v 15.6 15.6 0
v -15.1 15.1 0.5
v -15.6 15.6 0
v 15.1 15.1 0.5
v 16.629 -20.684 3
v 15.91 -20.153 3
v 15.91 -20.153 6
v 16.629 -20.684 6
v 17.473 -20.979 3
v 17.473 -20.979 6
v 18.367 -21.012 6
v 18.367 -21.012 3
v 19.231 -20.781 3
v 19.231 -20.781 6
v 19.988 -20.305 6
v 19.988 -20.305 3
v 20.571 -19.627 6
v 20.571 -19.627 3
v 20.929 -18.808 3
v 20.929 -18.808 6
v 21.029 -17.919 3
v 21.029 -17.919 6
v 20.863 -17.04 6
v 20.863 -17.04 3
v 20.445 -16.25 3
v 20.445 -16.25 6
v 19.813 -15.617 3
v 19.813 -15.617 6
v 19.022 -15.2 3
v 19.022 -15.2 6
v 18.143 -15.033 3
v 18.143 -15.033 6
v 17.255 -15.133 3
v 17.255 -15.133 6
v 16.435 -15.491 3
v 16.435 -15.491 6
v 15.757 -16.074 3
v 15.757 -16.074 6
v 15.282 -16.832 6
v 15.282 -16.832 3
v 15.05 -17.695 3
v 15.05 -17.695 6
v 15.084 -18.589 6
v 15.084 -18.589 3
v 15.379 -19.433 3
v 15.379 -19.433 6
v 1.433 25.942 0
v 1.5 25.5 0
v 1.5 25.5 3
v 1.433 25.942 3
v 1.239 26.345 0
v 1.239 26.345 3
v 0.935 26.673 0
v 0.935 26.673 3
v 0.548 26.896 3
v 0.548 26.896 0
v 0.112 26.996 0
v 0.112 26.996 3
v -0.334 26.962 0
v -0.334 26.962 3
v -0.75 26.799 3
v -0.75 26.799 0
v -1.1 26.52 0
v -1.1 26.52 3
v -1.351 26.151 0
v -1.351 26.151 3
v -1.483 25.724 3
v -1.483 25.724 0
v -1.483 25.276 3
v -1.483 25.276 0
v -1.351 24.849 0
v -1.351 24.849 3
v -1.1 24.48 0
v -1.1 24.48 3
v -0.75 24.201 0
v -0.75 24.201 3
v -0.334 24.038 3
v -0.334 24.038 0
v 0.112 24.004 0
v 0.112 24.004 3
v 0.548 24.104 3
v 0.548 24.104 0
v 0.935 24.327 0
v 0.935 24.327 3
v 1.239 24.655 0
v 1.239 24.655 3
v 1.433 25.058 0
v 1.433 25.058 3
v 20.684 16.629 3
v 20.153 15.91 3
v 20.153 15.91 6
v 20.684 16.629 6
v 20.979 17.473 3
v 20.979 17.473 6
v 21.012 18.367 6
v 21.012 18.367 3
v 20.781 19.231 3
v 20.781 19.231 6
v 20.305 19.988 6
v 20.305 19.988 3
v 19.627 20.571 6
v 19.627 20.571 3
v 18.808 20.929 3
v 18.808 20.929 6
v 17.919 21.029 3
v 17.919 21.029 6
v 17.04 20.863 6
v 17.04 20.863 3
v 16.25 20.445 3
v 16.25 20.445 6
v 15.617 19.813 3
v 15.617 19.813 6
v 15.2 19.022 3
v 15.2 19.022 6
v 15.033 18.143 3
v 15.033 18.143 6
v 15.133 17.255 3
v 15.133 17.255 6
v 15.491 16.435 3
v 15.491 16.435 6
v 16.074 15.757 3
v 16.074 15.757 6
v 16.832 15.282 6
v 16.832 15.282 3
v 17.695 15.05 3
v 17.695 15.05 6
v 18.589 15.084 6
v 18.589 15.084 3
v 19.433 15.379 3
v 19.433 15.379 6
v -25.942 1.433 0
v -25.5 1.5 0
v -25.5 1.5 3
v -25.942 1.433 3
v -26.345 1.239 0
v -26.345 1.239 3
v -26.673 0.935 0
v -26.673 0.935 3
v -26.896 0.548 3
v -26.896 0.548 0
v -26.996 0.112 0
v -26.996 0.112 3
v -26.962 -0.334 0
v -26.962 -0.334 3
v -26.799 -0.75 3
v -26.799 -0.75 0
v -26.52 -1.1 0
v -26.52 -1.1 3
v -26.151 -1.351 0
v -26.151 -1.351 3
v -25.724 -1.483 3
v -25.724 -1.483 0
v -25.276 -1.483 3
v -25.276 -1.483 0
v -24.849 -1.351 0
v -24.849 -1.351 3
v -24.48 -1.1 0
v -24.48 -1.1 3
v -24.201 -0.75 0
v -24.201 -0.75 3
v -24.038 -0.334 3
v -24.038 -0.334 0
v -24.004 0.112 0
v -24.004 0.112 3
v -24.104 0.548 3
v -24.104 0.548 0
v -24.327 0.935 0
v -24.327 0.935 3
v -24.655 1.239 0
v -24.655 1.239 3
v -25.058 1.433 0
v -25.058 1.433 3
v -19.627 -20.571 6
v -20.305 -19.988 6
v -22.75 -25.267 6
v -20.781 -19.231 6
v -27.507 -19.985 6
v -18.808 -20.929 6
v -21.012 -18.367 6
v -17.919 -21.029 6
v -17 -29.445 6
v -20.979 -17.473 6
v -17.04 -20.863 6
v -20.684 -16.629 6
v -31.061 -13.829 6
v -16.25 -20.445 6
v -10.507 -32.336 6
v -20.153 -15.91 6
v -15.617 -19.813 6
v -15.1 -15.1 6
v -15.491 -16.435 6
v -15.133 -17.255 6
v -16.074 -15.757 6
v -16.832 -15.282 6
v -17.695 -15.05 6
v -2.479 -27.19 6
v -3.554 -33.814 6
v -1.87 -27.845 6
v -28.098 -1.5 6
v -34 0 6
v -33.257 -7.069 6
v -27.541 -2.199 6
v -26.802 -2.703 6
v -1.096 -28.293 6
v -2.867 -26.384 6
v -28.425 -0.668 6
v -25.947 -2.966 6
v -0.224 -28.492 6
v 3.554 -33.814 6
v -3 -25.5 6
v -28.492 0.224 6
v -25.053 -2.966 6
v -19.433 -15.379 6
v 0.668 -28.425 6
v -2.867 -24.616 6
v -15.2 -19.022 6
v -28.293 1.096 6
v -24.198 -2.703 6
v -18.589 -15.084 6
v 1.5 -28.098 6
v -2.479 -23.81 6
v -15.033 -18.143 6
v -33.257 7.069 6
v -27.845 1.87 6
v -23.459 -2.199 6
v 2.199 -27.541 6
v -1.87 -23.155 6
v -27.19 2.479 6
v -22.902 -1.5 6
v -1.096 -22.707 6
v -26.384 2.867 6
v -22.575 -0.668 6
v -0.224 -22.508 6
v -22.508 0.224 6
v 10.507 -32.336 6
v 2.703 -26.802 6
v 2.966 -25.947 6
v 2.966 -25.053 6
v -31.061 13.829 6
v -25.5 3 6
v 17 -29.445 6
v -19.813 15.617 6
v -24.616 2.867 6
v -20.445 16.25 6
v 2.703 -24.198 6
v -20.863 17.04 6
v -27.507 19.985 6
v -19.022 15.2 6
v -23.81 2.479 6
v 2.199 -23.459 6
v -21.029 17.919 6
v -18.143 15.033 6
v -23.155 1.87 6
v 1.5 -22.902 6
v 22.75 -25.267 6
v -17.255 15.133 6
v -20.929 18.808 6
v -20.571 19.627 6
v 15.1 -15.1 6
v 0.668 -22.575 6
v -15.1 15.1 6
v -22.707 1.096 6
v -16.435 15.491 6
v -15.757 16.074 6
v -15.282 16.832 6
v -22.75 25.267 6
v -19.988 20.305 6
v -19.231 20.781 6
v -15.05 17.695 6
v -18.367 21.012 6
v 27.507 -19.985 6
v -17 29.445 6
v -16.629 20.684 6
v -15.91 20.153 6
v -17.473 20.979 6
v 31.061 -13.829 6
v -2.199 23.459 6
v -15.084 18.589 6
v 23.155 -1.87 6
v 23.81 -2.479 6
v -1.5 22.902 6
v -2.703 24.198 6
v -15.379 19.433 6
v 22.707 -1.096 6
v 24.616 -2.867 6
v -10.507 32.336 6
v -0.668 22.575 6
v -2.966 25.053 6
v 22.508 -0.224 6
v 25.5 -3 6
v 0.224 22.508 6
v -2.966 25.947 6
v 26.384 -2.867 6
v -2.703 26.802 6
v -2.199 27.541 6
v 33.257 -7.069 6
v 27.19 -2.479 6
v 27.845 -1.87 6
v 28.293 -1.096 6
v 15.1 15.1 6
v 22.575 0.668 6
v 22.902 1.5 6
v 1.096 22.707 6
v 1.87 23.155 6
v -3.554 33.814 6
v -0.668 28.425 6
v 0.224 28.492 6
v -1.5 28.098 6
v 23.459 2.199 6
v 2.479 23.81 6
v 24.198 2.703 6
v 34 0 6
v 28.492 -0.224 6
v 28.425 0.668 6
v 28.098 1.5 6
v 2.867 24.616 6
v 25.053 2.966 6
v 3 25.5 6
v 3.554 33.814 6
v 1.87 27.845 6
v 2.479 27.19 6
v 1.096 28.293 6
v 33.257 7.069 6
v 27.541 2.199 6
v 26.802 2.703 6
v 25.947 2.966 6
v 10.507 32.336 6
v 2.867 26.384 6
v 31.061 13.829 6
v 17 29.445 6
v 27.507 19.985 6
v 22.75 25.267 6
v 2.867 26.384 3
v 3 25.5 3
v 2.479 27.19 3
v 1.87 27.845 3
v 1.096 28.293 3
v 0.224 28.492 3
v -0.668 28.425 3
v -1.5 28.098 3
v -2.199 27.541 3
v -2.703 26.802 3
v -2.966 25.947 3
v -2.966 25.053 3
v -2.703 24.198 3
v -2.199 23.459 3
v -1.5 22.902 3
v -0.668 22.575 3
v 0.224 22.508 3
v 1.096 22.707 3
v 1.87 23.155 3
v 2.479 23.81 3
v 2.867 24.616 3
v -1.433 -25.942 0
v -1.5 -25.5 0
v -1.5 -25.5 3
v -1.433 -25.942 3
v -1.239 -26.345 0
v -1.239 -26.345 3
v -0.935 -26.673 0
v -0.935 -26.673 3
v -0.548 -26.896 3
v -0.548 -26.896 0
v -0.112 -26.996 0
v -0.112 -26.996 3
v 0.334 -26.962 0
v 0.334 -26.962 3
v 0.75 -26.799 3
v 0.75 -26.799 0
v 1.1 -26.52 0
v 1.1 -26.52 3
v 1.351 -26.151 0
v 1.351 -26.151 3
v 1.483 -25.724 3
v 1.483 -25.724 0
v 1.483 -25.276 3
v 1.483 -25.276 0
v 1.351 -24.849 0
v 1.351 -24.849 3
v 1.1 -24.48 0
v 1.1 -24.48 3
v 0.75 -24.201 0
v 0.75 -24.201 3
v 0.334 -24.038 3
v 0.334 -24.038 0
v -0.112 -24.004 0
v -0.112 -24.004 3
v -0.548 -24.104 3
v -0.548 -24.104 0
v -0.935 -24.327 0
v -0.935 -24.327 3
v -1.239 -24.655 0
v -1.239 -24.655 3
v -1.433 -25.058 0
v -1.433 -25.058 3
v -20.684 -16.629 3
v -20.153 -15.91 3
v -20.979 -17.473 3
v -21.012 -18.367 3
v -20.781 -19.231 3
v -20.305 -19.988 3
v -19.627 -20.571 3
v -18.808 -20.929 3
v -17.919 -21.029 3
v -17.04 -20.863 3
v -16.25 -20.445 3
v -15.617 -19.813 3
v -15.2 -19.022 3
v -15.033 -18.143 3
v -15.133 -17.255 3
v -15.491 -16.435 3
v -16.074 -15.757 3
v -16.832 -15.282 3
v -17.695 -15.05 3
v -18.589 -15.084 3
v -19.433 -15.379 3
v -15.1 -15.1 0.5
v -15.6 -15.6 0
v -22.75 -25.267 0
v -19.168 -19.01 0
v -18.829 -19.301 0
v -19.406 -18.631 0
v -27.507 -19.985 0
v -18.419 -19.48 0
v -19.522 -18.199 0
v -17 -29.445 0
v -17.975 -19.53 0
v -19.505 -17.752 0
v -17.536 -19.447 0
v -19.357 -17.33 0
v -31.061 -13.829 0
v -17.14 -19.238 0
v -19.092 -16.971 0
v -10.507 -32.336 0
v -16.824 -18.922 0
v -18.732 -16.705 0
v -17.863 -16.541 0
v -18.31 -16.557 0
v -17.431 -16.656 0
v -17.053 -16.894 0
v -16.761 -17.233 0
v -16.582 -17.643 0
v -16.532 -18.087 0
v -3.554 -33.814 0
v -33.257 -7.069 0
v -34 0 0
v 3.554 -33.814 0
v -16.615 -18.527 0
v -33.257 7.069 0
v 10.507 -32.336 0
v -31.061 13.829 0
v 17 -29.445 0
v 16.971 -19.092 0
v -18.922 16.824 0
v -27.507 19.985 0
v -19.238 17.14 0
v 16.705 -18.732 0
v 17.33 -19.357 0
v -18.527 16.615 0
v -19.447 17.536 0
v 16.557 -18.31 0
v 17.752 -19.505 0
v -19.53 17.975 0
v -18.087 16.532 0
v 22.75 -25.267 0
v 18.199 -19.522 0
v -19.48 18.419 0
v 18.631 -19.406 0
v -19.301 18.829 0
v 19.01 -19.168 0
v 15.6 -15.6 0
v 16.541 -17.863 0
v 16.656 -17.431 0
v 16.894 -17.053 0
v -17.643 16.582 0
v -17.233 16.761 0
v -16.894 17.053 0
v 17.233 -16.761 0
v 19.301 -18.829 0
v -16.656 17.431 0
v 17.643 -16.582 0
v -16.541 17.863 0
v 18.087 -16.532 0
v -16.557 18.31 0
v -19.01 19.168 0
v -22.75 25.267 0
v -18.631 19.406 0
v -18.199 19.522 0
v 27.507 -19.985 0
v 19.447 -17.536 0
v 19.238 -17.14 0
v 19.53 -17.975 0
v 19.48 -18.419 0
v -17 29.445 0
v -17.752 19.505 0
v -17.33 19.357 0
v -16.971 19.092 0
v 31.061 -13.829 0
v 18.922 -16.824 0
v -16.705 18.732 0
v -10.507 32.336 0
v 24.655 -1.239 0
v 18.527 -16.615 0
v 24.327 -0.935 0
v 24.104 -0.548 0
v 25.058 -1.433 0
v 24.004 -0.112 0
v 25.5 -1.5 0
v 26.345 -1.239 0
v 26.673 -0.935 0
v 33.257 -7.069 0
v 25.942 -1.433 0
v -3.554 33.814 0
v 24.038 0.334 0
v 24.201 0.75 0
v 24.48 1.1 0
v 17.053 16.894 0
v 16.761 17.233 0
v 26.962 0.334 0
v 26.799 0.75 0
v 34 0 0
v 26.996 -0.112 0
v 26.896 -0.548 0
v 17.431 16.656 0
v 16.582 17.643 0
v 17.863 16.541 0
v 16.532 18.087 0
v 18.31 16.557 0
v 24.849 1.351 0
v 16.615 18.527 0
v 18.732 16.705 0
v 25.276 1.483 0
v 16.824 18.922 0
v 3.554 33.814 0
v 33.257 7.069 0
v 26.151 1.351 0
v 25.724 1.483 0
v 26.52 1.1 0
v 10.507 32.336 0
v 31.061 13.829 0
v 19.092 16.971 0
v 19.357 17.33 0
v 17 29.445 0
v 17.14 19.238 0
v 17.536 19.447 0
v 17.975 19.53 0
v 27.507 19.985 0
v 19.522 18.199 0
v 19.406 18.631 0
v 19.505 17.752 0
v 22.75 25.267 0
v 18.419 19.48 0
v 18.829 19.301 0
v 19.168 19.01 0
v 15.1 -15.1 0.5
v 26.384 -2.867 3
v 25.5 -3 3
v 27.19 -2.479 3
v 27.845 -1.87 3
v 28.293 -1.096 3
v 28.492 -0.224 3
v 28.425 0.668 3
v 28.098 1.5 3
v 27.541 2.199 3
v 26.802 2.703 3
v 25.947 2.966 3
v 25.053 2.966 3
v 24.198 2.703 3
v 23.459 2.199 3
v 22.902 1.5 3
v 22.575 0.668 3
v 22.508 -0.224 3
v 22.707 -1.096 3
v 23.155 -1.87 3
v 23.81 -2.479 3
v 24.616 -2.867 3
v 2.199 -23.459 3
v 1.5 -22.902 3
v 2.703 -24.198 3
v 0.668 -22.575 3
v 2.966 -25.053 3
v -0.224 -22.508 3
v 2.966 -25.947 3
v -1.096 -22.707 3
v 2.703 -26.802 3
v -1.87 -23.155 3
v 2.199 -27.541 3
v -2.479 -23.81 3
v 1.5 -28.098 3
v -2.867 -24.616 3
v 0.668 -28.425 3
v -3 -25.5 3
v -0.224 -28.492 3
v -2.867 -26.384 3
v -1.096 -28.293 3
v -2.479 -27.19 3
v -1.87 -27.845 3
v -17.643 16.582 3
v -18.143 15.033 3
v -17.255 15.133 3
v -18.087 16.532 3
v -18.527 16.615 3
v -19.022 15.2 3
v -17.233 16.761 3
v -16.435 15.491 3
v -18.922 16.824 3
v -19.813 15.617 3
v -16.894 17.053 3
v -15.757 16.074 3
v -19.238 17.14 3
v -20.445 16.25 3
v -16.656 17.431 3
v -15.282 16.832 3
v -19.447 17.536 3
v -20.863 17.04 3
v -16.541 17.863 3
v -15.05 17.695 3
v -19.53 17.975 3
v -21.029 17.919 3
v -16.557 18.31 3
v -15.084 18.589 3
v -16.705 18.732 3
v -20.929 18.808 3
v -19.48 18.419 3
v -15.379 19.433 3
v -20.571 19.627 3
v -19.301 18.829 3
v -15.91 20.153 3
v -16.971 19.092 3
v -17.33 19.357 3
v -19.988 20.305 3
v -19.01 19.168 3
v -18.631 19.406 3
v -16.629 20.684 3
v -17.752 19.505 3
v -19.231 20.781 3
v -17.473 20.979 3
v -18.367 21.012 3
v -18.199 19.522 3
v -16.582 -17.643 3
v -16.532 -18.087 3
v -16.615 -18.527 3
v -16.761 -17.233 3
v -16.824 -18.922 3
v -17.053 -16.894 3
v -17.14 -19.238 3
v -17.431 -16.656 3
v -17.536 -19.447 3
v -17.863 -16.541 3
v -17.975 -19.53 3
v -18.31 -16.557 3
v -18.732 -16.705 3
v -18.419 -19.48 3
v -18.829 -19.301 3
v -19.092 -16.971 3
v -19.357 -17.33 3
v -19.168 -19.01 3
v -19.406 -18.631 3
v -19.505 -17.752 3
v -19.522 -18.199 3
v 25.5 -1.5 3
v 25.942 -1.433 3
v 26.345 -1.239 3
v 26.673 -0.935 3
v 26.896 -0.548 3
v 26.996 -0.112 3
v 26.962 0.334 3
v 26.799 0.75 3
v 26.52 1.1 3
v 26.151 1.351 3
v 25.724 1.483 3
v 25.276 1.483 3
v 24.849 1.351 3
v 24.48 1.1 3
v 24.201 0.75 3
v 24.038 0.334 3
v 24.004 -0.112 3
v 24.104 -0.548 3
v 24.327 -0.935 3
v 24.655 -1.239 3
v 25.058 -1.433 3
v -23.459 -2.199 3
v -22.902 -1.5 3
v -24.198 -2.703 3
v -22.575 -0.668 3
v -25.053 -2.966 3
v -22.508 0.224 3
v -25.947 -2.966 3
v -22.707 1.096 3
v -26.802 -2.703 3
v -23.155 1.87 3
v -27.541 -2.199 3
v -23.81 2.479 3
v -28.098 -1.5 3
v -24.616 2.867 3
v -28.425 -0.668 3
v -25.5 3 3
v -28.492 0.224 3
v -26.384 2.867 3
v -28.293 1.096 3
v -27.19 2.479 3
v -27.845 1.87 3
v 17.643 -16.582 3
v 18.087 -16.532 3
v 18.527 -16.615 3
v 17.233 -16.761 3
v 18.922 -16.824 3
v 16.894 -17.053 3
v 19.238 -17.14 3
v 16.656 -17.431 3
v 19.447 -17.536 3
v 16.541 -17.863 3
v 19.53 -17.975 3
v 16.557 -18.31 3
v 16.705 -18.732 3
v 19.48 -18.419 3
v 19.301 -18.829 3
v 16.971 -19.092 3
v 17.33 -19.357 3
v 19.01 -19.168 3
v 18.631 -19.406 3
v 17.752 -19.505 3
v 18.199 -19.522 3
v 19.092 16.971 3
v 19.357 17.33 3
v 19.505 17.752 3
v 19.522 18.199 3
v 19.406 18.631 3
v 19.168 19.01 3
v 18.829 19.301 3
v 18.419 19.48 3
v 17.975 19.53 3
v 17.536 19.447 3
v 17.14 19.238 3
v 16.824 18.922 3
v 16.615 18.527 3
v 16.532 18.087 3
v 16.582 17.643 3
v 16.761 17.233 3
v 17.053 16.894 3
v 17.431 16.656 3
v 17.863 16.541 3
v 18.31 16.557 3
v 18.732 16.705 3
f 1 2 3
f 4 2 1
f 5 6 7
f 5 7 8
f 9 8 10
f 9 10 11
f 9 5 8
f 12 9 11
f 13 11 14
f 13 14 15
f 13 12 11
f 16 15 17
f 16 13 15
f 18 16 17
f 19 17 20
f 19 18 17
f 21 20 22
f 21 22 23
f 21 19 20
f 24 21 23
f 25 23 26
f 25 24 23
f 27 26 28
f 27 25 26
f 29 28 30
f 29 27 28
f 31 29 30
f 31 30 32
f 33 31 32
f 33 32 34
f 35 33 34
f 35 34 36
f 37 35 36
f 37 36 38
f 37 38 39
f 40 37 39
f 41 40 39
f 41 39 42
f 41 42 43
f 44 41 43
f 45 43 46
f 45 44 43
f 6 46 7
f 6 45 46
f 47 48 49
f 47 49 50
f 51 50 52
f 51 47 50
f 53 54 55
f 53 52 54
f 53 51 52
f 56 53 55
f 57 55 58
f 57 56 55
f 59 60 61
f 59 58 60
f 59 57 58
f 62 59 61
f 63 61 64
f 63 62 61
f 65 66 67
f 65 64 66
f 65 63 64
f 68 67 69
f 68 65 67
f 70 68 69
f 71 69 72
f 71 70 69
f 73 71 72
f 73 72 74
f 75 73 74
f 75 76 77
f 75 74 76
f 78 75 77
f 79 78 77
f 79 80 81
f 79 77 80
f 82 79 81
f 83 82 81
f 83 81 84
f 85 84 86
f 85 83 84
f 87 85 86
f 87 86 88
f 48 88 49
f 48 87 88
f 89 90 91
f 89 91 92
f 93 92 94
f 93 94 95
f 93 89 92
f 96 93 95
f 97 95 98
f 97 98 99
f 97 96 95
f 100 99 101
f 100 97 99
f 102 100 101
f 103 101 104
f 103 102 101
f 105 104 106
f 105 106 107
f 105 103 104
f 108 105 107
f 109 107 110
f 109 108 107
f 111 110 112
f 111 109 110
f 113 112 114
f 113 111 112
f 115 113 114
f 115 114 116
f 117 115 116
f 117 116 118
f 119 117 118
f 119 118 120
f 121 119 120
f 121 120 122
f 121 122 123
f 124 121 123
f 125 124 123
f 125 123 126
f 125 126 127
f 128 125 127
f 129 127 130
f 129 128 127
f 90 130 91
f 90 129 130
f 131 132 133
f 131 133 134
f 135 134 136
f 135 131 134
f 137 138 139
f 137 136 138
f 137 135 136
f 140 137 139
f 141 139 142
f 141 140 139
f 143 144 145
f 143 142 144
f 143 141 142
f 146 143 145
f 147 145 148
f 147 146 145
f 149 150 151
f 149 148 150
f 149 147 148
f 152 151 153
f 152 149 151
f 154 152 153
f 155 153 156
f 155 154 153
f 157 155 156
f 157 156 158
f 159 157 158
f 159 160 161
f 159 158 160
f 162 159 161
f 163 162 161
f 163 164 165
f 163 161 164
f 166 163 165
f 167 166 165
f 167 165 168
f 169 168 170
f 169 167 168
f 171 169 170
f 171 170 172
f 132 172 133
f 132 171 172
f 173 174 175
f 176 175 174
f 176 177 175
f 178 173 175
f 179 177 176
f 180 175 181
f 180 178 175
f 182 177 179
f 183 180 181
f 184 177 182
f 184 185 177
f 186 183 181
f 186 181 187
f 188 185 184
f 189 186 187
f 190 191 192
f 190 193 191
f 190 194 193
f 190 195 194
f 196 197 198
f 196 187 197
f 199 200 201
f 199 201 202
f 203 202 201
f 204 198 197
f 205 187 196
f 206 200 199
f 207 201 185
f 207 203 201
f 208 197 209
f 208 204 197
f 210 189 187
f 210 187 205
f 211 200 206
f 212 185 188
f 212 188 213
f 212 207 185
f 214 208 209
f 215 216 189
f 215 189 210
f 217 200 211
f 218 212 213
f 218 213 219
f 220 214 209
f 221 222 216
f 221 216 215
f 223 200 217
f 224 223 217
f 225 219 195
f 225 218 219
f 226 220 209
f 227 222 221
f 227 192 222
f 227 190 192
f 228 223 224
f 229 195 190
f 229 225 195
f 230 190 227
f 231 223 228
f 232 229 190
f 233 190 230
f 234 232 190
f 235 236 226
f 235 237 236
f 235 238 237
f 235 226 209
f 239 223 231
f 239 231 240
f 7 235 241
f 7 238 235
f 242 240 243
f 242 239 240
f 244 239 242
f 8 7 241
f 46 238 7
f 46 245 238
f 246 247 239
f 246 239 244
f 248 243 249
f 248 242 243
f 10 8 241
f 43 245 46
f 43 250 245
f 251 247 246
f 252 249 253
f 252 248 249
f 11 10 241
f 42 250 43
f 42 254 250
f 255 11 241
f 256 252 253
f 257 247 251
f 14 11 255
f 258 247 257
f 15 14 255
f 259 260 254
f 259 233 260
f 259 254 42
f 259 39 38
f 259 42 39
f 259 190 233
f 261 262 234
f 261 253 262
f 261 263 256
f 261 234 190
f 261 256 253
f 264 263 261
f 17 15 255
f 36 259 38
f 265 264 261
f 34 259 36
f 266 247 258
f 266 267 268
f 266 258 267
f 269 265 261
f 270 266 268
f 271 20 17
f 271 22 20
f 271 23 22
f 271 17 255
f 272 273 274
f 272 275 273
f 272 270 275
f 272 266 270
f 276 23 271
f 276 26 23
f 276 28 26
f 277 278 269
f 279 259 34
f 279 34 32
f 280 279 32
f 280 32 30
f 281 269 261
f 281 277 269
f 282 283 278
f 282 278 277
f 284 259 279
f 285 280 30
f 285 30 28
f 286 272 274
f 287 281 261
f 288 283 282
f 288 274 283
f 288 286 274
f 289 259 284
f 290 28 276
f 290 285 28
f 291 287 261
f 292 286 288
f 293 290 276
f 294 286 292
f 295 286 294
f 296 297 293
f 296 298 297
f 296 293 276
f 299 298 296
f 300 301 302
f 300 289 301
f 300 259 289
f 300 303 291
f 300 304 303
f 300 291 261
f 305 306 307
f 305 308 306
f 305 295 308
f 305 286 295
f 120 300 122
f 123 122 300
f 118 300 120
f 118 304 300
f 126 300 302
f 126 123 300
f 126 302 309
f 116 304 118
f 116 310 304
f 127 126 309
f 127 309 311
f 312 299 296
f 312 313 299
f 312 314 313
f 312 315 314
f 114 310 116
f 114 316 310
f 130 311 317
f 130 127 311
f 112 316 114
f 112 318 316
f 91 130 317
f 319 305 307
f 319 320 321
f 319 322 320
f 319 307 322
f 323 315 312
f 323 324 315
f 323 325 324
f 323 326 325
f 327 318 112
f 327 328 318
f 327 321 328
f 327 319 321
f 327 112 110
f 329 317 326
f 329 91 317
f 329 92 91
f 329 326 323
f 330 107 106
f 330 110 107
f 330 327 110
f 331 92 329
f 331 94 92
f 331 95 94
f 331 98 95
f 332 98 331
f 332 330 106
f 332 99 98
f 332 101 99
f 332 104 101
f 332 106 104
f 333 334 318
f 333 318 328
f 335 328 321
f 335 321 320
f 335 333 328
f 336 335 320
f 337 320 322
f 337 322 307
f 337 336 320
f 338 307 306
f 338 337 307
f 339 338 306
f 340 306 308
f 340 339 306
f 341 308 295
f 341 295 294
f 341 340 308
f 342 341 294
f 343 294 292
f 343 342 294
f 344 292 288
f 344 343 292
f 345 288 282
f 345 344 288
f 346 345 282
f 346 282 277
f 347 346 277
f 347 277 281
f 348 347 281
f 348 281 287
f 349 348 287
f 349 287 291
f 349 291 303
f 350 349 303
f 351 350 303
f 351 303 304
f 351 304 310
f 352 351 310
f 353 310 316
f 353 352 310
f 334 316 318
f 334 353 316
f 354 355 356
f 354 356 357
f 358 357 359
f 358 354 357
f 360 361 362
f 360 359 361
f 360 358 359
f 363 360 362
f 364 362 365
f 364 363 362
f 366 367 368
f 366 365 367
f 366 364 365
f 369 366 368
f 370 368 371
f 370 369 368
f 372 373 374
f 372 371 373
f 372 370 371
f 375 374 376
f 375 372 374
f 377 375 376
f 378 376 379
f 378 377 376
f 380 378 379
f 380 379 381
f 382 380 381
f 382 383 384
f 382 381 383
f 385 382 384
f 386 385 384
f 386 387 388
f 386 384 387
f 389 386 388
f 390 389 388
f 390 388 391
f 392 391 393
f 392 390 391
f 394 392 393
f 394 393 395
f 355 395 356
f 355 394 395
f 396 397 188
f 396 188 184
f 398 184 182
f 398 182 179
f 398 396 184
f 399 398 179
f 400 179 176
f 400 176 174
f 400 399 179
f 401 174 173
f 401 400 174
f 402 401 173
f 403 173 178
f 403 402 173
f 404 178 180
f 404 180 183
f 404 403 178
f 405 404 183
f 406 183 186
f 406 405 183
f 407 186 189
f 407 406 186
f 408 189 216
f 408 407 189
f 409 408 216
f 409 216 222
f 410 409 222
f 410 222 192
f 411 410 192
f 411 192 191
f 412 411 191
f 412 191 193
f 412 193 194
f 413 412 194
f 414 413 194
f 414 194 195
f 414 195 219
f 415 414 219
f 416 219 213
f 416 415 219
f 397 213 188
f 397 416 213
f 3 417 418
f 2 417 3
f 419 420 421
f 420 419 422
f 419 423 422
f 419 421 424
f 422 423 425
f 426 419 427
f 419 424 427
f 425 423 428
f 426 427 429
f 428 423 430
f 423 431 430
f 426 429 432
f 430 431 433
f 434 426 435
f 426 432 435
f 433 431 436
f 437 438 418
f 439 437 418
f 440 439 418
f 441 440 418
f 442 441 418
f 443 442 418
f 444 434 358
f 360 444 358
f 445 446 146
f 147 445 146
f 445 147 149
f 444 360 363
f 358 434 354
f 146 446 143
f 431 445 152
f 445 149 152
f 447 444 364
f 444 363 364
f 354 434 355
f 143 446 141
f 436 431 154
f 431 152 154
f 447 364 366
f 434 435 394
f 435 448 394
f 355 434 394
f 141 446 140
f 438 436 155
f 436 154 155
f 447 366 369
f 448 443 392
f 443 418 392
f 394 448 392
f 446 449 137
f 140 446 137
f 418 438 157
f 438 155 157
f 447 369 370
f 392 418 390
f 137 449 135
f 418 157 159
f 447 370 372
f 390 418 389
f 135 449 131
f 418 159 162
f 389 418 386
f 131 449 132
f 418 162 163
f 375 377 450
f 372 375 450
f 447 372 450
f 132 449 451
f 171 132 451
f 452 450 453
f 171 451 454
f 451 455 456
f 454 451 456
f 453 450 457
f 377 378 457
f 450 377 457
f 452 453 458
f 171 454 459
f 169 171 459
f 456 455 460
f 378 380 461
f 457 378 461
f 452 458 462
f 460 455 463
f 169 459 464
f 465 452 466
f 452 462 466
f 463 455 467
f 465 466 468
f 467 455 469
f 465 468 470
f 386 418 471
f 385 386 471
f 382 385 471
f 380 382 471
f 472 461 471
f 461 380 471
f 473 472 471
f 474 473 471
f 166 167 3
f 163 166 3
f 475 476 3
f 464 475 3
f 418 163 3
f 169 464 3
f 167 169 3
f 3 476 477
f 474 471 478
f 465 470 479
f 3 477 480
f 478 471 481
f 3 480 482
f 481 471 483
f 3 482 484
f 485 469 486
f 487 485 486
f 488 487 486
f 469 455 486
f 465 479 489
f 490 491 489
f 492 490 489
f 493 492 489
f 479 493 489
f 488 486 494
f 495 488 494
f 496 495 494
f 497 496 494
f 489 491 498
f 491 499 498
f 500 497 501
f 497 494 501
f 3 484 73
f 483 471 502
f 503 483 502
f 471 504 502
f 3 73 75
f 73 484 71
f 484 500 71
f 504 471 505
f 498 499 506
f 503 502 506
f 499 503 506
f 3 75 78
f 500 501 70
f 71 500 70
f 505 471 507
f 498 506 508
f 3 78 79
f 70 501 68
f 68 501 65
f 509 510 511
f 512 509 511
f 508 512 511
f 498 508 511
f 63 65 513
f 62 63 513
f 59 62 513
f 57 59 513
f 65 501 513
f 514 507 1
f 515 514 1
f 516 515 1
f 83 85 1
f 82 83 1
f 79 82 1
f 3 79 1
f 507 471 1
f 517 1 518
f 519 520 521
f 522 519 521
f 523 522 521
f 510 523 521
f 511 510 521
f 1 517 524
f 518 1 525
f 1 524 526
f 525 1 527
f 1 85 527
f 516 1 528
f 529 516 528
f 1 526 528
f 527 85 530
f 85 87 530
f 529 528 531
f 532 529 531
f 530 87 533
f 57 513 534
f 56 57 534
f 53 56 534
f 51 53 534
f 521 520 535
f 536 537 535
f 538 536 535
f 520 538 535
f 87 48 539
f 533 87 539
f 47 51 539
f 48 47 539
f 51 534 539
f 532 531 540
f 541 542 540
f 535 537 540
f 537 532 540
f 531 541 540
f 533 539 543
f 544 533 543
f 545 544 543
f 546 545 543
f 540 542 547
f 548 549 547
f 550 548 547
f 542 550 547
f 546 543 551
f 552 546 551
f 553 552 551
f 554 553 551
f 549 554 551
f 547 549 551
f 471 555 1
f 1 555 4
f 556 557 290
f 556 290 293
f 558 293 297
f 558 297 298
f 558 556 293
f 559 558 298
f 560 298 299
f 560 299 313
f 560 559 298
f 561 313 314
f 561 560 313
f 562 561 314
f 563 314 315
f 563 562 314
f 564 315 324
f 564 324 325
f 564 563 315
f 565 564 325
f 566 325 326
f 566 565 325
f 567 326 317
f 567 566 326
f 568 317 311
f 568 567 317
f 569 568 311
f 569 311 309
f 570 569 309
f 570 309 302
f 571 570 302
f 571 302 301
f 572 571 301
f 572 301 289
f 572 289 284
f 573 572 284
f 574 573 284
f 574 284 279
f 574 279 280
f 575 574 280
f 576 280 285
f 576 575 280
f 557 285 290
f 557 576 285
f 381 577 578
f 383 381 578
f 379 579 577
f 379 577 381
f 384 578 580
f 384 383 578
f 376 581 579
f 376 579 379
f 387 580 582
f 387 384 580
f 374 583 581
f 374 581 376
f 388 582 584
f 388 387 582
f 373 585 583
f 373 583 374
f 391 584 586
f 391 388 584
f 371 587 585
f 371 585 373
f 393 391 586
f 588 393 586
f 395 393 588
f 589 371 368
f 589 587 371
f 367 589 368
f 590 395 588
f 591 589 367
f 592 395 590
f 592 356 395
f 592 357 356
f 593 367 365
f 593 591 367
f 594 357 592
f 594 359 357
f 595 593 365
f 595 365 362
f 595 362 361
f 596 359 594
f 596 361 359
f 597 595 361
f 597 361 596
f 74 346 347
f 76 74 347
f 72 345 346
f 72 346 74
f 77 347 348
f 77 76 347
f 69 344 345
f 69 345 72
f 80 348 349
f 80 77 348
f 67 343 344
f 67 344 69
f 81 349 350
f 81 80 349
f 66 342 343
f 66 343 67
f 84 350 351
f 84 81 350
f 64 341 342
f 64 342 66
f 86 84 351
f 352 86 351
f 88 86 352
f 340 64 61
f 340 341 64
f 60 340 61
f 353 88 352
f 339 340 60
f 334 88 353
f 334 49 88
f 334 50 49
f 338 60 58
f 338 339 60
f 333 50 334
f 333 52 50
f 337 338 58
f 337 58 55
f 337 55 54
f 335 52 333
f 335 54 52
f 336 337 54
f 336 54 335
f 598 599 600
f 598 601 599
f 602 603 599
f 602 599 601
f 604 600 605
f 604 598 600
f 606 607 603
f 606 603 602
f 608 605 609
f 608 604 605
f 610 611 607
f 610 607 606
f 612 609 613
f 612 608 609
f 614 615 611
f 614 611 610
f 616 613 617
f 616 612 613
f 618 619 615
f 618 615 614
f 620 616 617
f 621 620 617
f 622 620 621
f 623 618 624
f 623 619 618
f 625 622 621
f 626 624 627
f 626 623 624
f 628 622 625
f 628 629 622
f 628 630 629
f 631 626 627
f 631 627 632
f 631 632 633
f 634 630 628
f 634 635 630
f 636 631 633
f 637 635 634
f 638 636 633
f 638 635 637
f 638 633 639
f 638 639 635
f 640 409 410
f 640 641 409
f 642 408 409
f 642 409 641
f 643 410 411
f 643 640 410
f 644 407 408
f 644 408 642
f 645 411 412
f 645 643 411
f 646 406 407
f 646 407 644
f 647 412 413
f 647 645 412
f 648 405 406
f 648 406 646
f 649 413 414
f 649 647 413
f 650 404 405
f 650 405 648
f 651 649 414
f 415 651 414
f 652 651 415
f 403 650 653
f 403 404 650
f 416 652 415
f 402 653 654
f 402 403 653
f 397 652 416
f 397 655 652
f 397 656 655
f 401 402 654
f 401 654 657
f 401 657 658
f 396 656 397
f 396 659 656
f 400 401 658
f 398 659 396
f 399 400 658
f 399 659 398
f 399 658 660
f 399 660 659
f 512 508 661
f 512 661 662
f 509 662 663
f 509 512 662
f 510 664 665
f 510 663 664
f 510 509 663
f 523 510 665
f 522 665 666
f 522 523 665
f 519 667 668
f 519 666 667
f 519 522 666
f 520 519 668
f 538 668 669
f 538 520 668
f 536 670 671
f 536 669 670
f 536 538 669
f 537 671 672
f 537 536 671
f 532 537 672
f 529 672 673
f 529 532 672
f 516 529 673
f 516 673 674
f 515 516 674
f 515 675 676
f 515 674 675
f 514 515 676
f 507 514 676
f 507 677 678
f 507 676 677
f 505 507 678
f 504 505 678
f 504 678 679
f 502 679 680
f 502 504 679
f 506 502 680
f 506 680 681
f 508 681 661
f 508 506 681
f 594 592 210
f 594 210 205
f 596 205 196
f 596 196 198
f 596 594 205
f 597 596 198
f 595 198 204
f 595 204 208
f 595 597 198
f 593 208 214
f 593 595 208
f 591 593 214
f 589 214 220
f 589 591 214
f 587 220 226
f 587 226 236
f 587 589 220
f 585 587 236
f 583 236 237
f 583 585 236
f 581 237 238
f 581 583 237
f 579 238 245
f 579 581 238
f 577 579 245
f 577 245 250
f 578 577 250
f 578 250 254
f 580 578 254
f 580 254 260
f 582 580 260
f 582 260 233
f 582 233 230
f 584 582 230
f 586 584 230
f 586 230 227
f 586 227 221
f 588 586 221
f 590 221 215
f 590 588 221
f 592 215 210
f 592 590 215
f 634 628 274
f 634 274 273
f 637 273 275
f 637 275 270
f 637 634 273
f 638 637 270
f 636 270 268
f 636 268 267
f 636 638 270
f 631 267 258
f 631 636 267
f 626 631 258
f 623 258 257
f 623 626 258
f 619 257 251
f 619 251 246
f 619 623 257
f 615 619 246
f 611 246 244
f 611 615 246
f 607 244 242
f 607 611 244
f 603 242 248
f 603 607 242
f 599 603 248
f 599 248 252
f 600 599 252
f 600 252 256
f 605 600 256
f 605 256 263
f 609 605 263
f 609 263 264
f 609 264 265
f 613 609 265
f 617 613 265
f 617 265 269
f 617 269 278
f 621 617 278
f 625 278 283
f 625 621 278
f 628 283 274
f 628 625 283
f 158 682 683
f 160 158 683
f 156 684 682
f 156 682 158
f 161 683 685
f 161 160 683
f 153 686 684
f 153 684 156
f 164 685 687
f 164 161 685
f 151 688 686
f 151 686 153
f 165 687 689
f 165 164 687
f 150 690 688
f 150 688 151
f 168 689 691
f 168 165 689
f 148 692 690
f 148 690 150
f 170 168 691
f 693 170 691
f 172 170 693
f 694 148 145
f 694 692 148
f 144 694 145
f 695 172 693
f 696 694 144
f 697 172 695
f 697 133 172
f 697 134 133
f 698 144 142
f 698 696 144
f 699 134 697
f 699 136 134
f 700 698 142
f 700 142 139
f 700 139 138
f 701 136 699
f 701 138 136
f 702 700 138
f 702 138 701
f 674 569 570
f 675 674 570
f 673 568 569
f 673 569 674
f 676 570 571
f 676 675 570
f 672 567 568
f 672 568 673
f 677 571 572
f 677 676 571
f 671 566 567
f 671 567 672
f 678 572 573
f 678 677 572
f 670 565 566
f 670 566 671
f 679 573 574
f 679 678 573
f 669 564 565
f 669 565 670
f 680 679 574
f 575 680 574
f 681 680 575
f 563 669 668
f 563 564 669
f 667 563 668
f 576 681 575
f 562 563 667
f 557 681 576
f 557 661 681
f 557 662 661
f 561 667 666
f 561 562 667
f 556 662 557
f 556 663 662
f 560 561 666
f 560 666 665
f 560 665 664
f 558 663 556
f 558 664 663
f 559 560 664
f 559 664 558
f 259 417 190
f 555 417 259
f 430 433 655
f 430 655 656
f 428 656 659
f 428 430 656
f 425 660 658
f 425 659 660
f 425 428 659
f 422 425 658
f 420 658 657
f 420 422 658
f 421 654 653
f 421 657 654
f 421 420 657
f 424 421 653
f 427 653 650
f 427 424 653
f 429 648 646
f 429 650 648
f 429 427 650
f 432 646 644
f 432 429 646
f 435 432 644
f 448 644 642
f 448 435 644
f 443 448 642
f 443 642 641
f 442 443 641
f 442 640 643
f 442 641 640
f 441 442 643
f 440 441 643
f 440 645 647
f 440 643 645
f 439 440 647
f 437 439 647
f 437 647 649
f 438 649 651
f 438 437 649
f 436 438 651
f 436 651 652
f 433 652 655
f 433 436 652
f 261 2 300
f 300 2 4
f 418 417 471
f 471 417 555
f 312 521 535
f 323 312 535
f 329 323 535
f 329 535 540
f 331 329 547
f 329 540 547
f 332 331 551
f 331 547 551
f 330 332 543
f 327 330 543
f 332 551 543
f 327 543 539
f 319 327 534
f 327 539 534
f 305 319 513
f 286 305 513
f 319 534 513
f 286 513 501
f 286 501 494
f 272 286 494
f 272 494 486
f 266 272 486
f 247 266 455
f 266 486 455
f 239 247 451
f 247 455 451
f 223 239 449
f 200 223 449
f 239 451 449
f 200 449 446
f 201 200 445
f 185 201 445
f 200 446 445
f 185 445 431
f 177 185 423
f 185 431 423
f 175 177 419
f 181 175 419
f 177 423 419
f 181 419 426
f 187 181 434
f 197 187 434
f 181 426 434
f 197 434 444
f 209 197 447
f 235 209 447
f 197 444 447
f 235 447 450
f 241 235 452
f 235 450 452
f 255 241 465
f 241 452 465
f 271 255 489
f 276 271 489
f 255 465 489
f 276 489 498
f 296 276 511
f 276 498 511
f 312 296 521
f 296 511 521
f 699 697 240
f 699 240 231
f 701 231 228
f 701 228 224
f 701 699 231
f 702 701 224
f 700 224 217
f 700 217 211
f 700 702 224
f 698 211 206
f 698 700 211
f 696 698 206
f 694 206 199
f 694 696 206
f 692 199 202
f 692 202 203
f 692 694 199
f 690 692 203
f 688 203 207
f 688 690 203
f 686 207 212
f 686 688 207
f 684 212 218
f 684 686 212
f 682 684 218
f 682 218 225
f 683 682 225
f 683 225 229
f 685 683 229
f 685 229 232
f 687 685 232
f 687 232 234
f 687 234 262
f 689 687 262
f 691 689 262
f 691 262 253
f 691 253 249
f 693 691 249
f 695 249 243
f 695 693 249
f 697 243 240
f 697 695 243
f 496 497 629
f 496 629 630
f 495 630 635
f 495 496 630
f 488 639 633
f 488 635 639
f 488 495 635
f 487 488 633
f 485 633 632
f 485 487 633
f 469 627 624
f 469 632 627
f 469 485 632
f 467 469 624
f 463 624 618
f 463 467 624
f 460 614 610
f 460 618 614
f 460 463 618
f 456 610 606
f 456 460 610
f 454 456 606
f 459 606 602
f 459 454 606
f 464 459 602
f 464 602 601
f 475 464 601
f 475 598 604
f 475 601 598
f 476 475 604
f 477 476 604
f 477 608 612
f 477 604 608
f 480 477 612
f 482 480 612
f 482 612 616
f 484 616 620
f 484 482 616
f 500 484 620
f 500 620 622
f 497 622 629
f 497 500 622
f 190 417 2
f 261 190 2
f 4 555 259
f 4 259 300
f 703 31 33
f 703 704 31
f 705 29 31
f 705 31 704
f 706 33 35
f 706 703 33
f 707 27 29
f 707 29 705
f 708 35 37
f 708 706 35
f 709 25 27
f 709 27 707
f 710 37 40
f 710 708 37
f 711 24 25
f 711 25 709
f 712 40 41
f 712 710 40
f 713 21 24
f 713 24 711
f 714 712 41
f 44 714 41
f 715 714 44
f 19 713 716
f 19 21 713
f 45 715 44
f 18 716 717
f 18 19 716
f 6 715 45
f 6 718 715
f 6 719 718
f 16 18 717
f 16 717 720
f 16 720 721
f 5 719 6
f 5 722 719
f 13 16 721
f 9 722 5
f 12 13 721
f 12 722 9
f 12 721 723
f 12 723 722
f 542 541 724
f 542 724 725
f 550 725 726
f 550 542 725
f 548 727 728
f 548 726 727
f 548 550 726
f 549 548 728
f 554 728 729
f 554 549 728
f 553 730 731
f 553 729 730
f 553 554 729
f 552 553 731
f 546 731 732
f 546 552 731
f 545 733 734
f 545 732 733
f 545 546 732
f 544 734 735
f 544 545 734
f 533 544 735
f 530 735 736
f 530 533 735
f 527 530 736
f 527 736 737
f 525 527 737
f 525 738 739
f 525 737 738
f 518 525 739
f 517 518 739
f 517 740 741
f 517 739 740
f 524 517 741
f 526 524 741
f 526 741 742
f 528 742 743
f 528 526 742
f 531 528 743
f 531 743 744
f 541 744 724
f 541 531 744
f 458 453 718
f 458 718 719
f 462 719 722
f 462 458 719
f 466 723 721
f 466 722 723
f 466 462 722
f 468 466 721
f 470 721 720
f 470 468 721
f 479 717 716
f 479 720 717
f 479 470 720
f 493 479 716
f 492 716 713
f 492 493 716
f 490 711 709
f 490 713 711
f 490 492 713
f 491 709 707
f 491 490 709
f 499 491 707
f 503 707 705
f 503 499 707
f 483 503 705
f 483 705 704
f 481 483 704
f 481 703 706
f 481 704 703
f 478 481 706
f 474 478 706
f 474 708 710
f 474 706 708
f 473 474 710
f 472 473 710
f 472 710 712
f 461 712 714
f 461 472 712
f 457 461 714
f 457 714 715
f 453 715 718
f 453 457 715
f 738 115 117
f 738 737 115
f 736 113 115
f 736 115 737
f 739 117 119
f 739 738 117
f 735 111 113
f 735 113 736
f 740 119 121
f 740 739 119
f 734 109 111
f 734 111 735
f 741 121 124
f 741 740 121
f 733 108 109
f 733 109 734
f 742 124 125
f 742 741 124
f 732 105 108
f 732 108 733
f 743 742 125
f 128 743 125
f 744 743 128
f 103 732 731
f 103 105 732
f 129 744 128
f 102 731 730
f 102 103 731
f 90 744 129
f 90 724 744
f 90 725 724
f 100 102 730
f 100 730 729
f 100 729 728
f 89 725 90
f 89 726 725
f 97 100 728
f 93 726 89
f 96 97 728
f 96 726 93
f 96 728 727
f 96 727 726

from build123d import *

# Parameters (mm, degrees)
BOX743_W                     = 30.2
BOX743_H                     = 30.2
BOX743_DEPTH                 = 25
CYLINDER1930_R               = 1.5
CYLINDER1930_DEPTH           = 20
CYLINDER1930_PLACEMENT_ANGLE = 45
CYLINDER1927_R               = 1.5
CYLINDER1927_DEPTH           = 20
CYLINDER1933_R               = 1.5
CYLINDER1933_DEPTH           = 20
CYLINDER1933_PLACEMENT_ANGLE = 135
CYLINDER1929_R               = 1.5
CYLINDER1929_DEPTH           = 20
CYLINDER1935_R               = 1.5
CYLINDER1935_DEPTH           = 20
CYLINDER1935_PLACEMENT_ANGLE = 225
CYLINDER1928_R               = 1.5
CYLINDER1928_DEPTH           = 20
CYLINDER1943_R               = 1.5
CYLINDER1943_DEPTH           = 20
CYLINDER1943_PLACEMENT_ANGLE = 45
CYLINDER1937_R               = 1.5
CYLINDER1937_DEPTH           = 20
CYLINDER1940_R               = 3
CYLINDER1940_DEPTH           = 3
CYLINDER1940_PLACEMENT_ANGLE = 45
CYLINDER1942_R               = 3
CYLINDER1942_DEPTH           = 3
CYLINDER1941_R               = 3
CYLINDER1941_DEPTH           = 3
CYLINDER1941_PLACEMENT_ANGLE = 135
CYLINDER1939_R               = 3
CYLINDER1939_DEPTH           = 3
CYLINDER1932_R               = 3
CYLINDER1932_DEPTH           = 3
CYLINDER1932_PLACEMENT_ANGLE = 225
CYLINDER1938_R               = 3
CYLINDER1938_DEPTH           = 3
CYLINDER1931_R               = 3
CYLINDER1931_DEPTH           = 3
CYLINDER1931_PLACEMENT_ANGLE = 45
CYLINDER1934_R               = 3
CYLINDER1934_DEPTH           = 3
CYLINDER1936_R               = 34
CYLINDER1936_DEPTH           = 6
CHAMFER078_SIZE              = 0.5


with BuildPart() as krychle743:
    # Box743 → Box743 (new body)
    with BuildSketch(Plane(origin=(-15.1, -15.1, 0), x_dir=(1, 0, 0), z_dir=(0, 0, 1))):
        with Locations((15.1, 15.1)):
            Rectangle(BOX743_W, BOX743_H)
    extrude(amount=BOX743_DEPTH)


with BuildPart() as v_lec1930:
    # Cylinder1930 → Cylinder1930 (new body)
    with BuildSketch(Plane.XY):
        Circle(CYLINDER1930_R)
    extrude(amount=CYLINDER1930_DEPTH)


with BuildPart() as v_lec1930_1:
    # Cylinder1930 placement: moved
    add(v_lec1930.part.moved(Location((-18.031223, 18.031223, -4))).rotate(Axis((-18.031223, 18.031223, -4), (0, 0, 1)), CYLINDER1930_PLACEMENT_ANGLE))


with BuildPart() as v_lec1927:
    # Cylinder1927 → Cylinder1927 (new body)
    with BuildSketch(Plane(origin=(-25.5, 0, -4), x_dir=(0, 1, 0), z_dir=(0, 0, 1))):
        Circle(CYLINDER1927_R)
    extrude(amount=CYLINDER1927_DEPTH)


with BuildPart() as v_lec1933:
    # Cylinder1933 → Cylinder1933 (new body)
    with BuildSketch(Plane.XY):
        Circle(CYLINDER1933_R)
    extrude(amount=CYLINDER1933_DEPTH)


with BuildPart() as v_lec1933_1:
    # Cylinder1933 placement: moved
    add(v_lec1933.part.moved(Location((-18.031223, -18.031223, -4))).rotate(Axis((-18.031223, -18.031223, -4), (0, 0, 1)), CYLINDER1933_PLACEMENT_ANGLE))


with BuildPart() as v_lec1929:
    # Cylinder1929 → Cylinder1929 (new body)
    with BuildSketch(Plane(origin=(0, -25.5, -4), x_dir=(-1, 0, 0), z_dir=(0, 0, 1))):
        Circle(CYLINDER1929_R)
    extrude(amount=CYLINDER1929_DEPTH)


with BuildPart() as v_lec1935:
    # Cylinder1935 → Cylinder1935 (new body)
    with BuildSketch(Plane.XY):
        Circle(CYLINDER1935_R)
    extrude(amount=CYLINDER1935_DEPTH)


with BuildPart() as v_lec1935_1:
    # Cylinder1935 placement: moved
    add(v_lec1935.part.moved(Location((18.031223, -18.031223, -4))).rotate(Axis((18.031223, -18.031223, -4), (0, 0, 1)), CYLINDER1935_PLACEMENT_ANGLE))


with BuildPart() as v_lec1928:
    # Cylinder1928 → Cylinder1928 (new body)
    with BuildSketch(Plane(origin=(25.5, 0, -4), x_dir=(0, -1, 0), z_dir=(0, 0, 1))):
        Circle(CYLINDER1928_R)
    extrude(amount=CYLINDER1928_DEPTH)


with BuildPart() as v_lec1943:
    # Cylinder1943 → Cylinder1943 (new body)
    with BuildSketch(Plane.XY):
        Circle(CYLINDER1943_R)
    extrude(amount=CYLINDER1943_DEPTH)


with BuildPart() as v_lec1943_1:
    # Cylinder1943 placement: moved
    add(v_lec1943.part.moved(Location((18.031223, 18.031223, -4))).rotate(Axis((18.031223, 18.031223, -4), (0, 0, -1)), CYLINDER1943_PLACEMENT_ANGLE))


with BuildPart() as compound919:
    # Cylinder1937 → Cylinder1937 (new body)
    with BuildSketch(Plane(origin=(0, 25.5, -4), x_dir=(1, 0, 0), z_dir=(0, 0, 1))):
        Circle(CYLINDER1937_R)
    extrude(amount=CYLINDER1937_DEPTH)

    # Compound919: union Válec1930, Válec1927, Válec1933, Válec1929, Válec1935, Válec1928, Válec1943
    add(v_lec1930_1.part)
    add(v_lec1927.part)
    add(v_lec1933_1.part)
    add(v_lec1929.part)
    add(v_lec1935_1.part)
    add(v_lec1928.part)
    add(v_lec1943_1.part)


with BuildPart() as v_lec1940:
    # Cylinder1940 → Cylinder1940 (new body)
    with BuildSketch(Plane.XY):
        Circle(CYLINDER1940_R)
    extrude(amount=CYLINDER1940_DEPTH)


with BuildPart() as v_lec1940_1:
    # Cylinder1940 placement: moved
    add(v_lec1940.part.moved(Location((-18.031223, 18.031223, 3))).rotate(Axis((-18.031223, 18.031223, 3), (0, 0, 1)), CYLINDER1940_PLACEMENT_ANGLE))


with BuildPart() as v_lec1942:
    # Cylinder1942 → Cylinder1942 (new body)
    with BuildSketch(Plane(origin=(-25.5, 0, 3), x_dir=(0, 1, 0), z_dir=(0, 0, 1))):
        Circle(CYLINDER1942_R)
    extrude(amount=CYLINDER1942_DEPTH)


with BuildPart() as v_lec1941:
    # Cylinder1941 → Cylinder1941 (new body)
    with BuildSketch(Plane.XY):
        Circle(CYLINDER1941_R)
    extrude(amount=CYLINDER1941_DEPTH)


with BuildPart() as v_lec1941_1:
    # Cylinder1941 placement: moved
    add(v_lec1941.part.moved(Location((-18.031223, -18.031223, 3))).rotate(Axis((-18.031223, -18.031223, 3), (0, 0, 1)), CYLINDER1941_PLACEMENT_ANGLE))


with BuildPart() as v_lec1939:
    # Cylinder1939 → Cylinder1939 (new body)
    with BuildSketch(Plane(origin=(0, -25.5, 3), x_dir=(-1, 0, 0), z_dir=(0, 0, 1))):
        Circle(CYLINDER1939_R)
    extrude(amount=CYLINDER1939_DEPTH)


with BuildPart() as v_lec1932:
    # Cylinder1932 → Cylinder1932 (new body)
    with BuildSketch(Plane.XY):
        Circle(CYLINDER1932_R)
    extrude(amount=CYLINDER1932_DEPTH)


with BuildPart() as v_lec1932_1:
    # Cylinder1932 placement: moved
    add(v_lec1932.part.moved(Location((18.031223, -18.031223, 3))).rotate(Axis((18.031223, -18.031223, 3), (0, 0, 1)), CYLINDER1932_PLACEMENT_ANGLE))


with BuildPart() as v_lec1938:
    # Cylinder1938 → Cylinder1938 (new body)
    with BuildSketch(Plane(origin=(25.5, 0, 3), x_dir=(0, -1, 0), z_dir=(0, 0, 1))):
        Circle(CYLINDER1938_R)
    extrude(amount=CYLINDER1938_DEPTH)


with BuildPart() as v_lec1931:
    # Cylinder1931 → Cylinder1931 (new body)
    with BuildSketch(Plane.XY):
        Circle(CYLINDER1931_R)
    extrude(amount=CYLINDER1931_DEPTH)


with BuildPart() as v_lec1931_1:
    # Cylinder1931 placement: moved
    add(v_lec1931.part.moved(Location((18.031223, 18.031223, 3))).rotate(Axis((18.031223, 18.031223, 3), (0, 0, -1)), CYLINDER1931_PLACEMENT_ANGLE))


with BuildPart() as compound918:
    # Cylinder1934 → Cylinder1934 (new body)
    with BuildSketch(Plane(origin=(0, 25.5, 3), x_dir=(1, 0, 0), z_dir=(0, 0, 1))):
        Circle(CYLINDER1934_R)
    extrude(amount=CYLINDER1934_DEPTH)

    # Compound918: union Válec1940, Válec1942, Válec1941, Válec1939, Válec1932, Válec1938, Válec1931
    add(v_lec1940_1.part)
    add(v_lec1942.part)
    add(v_lec1941_1.part)
    add(v_lec1939.part)
    add(v_lec1932_1.part)
    add(v_lec1938.part)
    add(v_lec1931_1.part)


with BuildPart() as chamfer078:
    # Cylinder1936 → Cylinder1936 (new body)
    with BuildSketch(Plane.XY):
        Circle(CYLINDER1936_R)
    extrude(amount=CYLINDER1936_DEPTH)

    # Cut565: cut Compound918
    add(compound918.part, mode=Mode.SUBTRACT)

    # Cut566: cut Compound919
    add(compound919.part, mode=Mode.SUBTRACT)

    # Cut568: cut Krychle743
    add(krychle743.part, mode=Mode.SUBTRACT)

    # Chamfer078
    chamfer078_edges = [chamfer078.edges().sort_by_distance(p)[0] for p in [
        (-15.1, 0, 0),
        (0, -15.1, 0),
        (15.1, 0, 0),
        (0, 15.1, 0),
    ]]
    chamfer(chamfer078_edges, length=CHAMFER078_SIZE)


solid = chamfer078.part
